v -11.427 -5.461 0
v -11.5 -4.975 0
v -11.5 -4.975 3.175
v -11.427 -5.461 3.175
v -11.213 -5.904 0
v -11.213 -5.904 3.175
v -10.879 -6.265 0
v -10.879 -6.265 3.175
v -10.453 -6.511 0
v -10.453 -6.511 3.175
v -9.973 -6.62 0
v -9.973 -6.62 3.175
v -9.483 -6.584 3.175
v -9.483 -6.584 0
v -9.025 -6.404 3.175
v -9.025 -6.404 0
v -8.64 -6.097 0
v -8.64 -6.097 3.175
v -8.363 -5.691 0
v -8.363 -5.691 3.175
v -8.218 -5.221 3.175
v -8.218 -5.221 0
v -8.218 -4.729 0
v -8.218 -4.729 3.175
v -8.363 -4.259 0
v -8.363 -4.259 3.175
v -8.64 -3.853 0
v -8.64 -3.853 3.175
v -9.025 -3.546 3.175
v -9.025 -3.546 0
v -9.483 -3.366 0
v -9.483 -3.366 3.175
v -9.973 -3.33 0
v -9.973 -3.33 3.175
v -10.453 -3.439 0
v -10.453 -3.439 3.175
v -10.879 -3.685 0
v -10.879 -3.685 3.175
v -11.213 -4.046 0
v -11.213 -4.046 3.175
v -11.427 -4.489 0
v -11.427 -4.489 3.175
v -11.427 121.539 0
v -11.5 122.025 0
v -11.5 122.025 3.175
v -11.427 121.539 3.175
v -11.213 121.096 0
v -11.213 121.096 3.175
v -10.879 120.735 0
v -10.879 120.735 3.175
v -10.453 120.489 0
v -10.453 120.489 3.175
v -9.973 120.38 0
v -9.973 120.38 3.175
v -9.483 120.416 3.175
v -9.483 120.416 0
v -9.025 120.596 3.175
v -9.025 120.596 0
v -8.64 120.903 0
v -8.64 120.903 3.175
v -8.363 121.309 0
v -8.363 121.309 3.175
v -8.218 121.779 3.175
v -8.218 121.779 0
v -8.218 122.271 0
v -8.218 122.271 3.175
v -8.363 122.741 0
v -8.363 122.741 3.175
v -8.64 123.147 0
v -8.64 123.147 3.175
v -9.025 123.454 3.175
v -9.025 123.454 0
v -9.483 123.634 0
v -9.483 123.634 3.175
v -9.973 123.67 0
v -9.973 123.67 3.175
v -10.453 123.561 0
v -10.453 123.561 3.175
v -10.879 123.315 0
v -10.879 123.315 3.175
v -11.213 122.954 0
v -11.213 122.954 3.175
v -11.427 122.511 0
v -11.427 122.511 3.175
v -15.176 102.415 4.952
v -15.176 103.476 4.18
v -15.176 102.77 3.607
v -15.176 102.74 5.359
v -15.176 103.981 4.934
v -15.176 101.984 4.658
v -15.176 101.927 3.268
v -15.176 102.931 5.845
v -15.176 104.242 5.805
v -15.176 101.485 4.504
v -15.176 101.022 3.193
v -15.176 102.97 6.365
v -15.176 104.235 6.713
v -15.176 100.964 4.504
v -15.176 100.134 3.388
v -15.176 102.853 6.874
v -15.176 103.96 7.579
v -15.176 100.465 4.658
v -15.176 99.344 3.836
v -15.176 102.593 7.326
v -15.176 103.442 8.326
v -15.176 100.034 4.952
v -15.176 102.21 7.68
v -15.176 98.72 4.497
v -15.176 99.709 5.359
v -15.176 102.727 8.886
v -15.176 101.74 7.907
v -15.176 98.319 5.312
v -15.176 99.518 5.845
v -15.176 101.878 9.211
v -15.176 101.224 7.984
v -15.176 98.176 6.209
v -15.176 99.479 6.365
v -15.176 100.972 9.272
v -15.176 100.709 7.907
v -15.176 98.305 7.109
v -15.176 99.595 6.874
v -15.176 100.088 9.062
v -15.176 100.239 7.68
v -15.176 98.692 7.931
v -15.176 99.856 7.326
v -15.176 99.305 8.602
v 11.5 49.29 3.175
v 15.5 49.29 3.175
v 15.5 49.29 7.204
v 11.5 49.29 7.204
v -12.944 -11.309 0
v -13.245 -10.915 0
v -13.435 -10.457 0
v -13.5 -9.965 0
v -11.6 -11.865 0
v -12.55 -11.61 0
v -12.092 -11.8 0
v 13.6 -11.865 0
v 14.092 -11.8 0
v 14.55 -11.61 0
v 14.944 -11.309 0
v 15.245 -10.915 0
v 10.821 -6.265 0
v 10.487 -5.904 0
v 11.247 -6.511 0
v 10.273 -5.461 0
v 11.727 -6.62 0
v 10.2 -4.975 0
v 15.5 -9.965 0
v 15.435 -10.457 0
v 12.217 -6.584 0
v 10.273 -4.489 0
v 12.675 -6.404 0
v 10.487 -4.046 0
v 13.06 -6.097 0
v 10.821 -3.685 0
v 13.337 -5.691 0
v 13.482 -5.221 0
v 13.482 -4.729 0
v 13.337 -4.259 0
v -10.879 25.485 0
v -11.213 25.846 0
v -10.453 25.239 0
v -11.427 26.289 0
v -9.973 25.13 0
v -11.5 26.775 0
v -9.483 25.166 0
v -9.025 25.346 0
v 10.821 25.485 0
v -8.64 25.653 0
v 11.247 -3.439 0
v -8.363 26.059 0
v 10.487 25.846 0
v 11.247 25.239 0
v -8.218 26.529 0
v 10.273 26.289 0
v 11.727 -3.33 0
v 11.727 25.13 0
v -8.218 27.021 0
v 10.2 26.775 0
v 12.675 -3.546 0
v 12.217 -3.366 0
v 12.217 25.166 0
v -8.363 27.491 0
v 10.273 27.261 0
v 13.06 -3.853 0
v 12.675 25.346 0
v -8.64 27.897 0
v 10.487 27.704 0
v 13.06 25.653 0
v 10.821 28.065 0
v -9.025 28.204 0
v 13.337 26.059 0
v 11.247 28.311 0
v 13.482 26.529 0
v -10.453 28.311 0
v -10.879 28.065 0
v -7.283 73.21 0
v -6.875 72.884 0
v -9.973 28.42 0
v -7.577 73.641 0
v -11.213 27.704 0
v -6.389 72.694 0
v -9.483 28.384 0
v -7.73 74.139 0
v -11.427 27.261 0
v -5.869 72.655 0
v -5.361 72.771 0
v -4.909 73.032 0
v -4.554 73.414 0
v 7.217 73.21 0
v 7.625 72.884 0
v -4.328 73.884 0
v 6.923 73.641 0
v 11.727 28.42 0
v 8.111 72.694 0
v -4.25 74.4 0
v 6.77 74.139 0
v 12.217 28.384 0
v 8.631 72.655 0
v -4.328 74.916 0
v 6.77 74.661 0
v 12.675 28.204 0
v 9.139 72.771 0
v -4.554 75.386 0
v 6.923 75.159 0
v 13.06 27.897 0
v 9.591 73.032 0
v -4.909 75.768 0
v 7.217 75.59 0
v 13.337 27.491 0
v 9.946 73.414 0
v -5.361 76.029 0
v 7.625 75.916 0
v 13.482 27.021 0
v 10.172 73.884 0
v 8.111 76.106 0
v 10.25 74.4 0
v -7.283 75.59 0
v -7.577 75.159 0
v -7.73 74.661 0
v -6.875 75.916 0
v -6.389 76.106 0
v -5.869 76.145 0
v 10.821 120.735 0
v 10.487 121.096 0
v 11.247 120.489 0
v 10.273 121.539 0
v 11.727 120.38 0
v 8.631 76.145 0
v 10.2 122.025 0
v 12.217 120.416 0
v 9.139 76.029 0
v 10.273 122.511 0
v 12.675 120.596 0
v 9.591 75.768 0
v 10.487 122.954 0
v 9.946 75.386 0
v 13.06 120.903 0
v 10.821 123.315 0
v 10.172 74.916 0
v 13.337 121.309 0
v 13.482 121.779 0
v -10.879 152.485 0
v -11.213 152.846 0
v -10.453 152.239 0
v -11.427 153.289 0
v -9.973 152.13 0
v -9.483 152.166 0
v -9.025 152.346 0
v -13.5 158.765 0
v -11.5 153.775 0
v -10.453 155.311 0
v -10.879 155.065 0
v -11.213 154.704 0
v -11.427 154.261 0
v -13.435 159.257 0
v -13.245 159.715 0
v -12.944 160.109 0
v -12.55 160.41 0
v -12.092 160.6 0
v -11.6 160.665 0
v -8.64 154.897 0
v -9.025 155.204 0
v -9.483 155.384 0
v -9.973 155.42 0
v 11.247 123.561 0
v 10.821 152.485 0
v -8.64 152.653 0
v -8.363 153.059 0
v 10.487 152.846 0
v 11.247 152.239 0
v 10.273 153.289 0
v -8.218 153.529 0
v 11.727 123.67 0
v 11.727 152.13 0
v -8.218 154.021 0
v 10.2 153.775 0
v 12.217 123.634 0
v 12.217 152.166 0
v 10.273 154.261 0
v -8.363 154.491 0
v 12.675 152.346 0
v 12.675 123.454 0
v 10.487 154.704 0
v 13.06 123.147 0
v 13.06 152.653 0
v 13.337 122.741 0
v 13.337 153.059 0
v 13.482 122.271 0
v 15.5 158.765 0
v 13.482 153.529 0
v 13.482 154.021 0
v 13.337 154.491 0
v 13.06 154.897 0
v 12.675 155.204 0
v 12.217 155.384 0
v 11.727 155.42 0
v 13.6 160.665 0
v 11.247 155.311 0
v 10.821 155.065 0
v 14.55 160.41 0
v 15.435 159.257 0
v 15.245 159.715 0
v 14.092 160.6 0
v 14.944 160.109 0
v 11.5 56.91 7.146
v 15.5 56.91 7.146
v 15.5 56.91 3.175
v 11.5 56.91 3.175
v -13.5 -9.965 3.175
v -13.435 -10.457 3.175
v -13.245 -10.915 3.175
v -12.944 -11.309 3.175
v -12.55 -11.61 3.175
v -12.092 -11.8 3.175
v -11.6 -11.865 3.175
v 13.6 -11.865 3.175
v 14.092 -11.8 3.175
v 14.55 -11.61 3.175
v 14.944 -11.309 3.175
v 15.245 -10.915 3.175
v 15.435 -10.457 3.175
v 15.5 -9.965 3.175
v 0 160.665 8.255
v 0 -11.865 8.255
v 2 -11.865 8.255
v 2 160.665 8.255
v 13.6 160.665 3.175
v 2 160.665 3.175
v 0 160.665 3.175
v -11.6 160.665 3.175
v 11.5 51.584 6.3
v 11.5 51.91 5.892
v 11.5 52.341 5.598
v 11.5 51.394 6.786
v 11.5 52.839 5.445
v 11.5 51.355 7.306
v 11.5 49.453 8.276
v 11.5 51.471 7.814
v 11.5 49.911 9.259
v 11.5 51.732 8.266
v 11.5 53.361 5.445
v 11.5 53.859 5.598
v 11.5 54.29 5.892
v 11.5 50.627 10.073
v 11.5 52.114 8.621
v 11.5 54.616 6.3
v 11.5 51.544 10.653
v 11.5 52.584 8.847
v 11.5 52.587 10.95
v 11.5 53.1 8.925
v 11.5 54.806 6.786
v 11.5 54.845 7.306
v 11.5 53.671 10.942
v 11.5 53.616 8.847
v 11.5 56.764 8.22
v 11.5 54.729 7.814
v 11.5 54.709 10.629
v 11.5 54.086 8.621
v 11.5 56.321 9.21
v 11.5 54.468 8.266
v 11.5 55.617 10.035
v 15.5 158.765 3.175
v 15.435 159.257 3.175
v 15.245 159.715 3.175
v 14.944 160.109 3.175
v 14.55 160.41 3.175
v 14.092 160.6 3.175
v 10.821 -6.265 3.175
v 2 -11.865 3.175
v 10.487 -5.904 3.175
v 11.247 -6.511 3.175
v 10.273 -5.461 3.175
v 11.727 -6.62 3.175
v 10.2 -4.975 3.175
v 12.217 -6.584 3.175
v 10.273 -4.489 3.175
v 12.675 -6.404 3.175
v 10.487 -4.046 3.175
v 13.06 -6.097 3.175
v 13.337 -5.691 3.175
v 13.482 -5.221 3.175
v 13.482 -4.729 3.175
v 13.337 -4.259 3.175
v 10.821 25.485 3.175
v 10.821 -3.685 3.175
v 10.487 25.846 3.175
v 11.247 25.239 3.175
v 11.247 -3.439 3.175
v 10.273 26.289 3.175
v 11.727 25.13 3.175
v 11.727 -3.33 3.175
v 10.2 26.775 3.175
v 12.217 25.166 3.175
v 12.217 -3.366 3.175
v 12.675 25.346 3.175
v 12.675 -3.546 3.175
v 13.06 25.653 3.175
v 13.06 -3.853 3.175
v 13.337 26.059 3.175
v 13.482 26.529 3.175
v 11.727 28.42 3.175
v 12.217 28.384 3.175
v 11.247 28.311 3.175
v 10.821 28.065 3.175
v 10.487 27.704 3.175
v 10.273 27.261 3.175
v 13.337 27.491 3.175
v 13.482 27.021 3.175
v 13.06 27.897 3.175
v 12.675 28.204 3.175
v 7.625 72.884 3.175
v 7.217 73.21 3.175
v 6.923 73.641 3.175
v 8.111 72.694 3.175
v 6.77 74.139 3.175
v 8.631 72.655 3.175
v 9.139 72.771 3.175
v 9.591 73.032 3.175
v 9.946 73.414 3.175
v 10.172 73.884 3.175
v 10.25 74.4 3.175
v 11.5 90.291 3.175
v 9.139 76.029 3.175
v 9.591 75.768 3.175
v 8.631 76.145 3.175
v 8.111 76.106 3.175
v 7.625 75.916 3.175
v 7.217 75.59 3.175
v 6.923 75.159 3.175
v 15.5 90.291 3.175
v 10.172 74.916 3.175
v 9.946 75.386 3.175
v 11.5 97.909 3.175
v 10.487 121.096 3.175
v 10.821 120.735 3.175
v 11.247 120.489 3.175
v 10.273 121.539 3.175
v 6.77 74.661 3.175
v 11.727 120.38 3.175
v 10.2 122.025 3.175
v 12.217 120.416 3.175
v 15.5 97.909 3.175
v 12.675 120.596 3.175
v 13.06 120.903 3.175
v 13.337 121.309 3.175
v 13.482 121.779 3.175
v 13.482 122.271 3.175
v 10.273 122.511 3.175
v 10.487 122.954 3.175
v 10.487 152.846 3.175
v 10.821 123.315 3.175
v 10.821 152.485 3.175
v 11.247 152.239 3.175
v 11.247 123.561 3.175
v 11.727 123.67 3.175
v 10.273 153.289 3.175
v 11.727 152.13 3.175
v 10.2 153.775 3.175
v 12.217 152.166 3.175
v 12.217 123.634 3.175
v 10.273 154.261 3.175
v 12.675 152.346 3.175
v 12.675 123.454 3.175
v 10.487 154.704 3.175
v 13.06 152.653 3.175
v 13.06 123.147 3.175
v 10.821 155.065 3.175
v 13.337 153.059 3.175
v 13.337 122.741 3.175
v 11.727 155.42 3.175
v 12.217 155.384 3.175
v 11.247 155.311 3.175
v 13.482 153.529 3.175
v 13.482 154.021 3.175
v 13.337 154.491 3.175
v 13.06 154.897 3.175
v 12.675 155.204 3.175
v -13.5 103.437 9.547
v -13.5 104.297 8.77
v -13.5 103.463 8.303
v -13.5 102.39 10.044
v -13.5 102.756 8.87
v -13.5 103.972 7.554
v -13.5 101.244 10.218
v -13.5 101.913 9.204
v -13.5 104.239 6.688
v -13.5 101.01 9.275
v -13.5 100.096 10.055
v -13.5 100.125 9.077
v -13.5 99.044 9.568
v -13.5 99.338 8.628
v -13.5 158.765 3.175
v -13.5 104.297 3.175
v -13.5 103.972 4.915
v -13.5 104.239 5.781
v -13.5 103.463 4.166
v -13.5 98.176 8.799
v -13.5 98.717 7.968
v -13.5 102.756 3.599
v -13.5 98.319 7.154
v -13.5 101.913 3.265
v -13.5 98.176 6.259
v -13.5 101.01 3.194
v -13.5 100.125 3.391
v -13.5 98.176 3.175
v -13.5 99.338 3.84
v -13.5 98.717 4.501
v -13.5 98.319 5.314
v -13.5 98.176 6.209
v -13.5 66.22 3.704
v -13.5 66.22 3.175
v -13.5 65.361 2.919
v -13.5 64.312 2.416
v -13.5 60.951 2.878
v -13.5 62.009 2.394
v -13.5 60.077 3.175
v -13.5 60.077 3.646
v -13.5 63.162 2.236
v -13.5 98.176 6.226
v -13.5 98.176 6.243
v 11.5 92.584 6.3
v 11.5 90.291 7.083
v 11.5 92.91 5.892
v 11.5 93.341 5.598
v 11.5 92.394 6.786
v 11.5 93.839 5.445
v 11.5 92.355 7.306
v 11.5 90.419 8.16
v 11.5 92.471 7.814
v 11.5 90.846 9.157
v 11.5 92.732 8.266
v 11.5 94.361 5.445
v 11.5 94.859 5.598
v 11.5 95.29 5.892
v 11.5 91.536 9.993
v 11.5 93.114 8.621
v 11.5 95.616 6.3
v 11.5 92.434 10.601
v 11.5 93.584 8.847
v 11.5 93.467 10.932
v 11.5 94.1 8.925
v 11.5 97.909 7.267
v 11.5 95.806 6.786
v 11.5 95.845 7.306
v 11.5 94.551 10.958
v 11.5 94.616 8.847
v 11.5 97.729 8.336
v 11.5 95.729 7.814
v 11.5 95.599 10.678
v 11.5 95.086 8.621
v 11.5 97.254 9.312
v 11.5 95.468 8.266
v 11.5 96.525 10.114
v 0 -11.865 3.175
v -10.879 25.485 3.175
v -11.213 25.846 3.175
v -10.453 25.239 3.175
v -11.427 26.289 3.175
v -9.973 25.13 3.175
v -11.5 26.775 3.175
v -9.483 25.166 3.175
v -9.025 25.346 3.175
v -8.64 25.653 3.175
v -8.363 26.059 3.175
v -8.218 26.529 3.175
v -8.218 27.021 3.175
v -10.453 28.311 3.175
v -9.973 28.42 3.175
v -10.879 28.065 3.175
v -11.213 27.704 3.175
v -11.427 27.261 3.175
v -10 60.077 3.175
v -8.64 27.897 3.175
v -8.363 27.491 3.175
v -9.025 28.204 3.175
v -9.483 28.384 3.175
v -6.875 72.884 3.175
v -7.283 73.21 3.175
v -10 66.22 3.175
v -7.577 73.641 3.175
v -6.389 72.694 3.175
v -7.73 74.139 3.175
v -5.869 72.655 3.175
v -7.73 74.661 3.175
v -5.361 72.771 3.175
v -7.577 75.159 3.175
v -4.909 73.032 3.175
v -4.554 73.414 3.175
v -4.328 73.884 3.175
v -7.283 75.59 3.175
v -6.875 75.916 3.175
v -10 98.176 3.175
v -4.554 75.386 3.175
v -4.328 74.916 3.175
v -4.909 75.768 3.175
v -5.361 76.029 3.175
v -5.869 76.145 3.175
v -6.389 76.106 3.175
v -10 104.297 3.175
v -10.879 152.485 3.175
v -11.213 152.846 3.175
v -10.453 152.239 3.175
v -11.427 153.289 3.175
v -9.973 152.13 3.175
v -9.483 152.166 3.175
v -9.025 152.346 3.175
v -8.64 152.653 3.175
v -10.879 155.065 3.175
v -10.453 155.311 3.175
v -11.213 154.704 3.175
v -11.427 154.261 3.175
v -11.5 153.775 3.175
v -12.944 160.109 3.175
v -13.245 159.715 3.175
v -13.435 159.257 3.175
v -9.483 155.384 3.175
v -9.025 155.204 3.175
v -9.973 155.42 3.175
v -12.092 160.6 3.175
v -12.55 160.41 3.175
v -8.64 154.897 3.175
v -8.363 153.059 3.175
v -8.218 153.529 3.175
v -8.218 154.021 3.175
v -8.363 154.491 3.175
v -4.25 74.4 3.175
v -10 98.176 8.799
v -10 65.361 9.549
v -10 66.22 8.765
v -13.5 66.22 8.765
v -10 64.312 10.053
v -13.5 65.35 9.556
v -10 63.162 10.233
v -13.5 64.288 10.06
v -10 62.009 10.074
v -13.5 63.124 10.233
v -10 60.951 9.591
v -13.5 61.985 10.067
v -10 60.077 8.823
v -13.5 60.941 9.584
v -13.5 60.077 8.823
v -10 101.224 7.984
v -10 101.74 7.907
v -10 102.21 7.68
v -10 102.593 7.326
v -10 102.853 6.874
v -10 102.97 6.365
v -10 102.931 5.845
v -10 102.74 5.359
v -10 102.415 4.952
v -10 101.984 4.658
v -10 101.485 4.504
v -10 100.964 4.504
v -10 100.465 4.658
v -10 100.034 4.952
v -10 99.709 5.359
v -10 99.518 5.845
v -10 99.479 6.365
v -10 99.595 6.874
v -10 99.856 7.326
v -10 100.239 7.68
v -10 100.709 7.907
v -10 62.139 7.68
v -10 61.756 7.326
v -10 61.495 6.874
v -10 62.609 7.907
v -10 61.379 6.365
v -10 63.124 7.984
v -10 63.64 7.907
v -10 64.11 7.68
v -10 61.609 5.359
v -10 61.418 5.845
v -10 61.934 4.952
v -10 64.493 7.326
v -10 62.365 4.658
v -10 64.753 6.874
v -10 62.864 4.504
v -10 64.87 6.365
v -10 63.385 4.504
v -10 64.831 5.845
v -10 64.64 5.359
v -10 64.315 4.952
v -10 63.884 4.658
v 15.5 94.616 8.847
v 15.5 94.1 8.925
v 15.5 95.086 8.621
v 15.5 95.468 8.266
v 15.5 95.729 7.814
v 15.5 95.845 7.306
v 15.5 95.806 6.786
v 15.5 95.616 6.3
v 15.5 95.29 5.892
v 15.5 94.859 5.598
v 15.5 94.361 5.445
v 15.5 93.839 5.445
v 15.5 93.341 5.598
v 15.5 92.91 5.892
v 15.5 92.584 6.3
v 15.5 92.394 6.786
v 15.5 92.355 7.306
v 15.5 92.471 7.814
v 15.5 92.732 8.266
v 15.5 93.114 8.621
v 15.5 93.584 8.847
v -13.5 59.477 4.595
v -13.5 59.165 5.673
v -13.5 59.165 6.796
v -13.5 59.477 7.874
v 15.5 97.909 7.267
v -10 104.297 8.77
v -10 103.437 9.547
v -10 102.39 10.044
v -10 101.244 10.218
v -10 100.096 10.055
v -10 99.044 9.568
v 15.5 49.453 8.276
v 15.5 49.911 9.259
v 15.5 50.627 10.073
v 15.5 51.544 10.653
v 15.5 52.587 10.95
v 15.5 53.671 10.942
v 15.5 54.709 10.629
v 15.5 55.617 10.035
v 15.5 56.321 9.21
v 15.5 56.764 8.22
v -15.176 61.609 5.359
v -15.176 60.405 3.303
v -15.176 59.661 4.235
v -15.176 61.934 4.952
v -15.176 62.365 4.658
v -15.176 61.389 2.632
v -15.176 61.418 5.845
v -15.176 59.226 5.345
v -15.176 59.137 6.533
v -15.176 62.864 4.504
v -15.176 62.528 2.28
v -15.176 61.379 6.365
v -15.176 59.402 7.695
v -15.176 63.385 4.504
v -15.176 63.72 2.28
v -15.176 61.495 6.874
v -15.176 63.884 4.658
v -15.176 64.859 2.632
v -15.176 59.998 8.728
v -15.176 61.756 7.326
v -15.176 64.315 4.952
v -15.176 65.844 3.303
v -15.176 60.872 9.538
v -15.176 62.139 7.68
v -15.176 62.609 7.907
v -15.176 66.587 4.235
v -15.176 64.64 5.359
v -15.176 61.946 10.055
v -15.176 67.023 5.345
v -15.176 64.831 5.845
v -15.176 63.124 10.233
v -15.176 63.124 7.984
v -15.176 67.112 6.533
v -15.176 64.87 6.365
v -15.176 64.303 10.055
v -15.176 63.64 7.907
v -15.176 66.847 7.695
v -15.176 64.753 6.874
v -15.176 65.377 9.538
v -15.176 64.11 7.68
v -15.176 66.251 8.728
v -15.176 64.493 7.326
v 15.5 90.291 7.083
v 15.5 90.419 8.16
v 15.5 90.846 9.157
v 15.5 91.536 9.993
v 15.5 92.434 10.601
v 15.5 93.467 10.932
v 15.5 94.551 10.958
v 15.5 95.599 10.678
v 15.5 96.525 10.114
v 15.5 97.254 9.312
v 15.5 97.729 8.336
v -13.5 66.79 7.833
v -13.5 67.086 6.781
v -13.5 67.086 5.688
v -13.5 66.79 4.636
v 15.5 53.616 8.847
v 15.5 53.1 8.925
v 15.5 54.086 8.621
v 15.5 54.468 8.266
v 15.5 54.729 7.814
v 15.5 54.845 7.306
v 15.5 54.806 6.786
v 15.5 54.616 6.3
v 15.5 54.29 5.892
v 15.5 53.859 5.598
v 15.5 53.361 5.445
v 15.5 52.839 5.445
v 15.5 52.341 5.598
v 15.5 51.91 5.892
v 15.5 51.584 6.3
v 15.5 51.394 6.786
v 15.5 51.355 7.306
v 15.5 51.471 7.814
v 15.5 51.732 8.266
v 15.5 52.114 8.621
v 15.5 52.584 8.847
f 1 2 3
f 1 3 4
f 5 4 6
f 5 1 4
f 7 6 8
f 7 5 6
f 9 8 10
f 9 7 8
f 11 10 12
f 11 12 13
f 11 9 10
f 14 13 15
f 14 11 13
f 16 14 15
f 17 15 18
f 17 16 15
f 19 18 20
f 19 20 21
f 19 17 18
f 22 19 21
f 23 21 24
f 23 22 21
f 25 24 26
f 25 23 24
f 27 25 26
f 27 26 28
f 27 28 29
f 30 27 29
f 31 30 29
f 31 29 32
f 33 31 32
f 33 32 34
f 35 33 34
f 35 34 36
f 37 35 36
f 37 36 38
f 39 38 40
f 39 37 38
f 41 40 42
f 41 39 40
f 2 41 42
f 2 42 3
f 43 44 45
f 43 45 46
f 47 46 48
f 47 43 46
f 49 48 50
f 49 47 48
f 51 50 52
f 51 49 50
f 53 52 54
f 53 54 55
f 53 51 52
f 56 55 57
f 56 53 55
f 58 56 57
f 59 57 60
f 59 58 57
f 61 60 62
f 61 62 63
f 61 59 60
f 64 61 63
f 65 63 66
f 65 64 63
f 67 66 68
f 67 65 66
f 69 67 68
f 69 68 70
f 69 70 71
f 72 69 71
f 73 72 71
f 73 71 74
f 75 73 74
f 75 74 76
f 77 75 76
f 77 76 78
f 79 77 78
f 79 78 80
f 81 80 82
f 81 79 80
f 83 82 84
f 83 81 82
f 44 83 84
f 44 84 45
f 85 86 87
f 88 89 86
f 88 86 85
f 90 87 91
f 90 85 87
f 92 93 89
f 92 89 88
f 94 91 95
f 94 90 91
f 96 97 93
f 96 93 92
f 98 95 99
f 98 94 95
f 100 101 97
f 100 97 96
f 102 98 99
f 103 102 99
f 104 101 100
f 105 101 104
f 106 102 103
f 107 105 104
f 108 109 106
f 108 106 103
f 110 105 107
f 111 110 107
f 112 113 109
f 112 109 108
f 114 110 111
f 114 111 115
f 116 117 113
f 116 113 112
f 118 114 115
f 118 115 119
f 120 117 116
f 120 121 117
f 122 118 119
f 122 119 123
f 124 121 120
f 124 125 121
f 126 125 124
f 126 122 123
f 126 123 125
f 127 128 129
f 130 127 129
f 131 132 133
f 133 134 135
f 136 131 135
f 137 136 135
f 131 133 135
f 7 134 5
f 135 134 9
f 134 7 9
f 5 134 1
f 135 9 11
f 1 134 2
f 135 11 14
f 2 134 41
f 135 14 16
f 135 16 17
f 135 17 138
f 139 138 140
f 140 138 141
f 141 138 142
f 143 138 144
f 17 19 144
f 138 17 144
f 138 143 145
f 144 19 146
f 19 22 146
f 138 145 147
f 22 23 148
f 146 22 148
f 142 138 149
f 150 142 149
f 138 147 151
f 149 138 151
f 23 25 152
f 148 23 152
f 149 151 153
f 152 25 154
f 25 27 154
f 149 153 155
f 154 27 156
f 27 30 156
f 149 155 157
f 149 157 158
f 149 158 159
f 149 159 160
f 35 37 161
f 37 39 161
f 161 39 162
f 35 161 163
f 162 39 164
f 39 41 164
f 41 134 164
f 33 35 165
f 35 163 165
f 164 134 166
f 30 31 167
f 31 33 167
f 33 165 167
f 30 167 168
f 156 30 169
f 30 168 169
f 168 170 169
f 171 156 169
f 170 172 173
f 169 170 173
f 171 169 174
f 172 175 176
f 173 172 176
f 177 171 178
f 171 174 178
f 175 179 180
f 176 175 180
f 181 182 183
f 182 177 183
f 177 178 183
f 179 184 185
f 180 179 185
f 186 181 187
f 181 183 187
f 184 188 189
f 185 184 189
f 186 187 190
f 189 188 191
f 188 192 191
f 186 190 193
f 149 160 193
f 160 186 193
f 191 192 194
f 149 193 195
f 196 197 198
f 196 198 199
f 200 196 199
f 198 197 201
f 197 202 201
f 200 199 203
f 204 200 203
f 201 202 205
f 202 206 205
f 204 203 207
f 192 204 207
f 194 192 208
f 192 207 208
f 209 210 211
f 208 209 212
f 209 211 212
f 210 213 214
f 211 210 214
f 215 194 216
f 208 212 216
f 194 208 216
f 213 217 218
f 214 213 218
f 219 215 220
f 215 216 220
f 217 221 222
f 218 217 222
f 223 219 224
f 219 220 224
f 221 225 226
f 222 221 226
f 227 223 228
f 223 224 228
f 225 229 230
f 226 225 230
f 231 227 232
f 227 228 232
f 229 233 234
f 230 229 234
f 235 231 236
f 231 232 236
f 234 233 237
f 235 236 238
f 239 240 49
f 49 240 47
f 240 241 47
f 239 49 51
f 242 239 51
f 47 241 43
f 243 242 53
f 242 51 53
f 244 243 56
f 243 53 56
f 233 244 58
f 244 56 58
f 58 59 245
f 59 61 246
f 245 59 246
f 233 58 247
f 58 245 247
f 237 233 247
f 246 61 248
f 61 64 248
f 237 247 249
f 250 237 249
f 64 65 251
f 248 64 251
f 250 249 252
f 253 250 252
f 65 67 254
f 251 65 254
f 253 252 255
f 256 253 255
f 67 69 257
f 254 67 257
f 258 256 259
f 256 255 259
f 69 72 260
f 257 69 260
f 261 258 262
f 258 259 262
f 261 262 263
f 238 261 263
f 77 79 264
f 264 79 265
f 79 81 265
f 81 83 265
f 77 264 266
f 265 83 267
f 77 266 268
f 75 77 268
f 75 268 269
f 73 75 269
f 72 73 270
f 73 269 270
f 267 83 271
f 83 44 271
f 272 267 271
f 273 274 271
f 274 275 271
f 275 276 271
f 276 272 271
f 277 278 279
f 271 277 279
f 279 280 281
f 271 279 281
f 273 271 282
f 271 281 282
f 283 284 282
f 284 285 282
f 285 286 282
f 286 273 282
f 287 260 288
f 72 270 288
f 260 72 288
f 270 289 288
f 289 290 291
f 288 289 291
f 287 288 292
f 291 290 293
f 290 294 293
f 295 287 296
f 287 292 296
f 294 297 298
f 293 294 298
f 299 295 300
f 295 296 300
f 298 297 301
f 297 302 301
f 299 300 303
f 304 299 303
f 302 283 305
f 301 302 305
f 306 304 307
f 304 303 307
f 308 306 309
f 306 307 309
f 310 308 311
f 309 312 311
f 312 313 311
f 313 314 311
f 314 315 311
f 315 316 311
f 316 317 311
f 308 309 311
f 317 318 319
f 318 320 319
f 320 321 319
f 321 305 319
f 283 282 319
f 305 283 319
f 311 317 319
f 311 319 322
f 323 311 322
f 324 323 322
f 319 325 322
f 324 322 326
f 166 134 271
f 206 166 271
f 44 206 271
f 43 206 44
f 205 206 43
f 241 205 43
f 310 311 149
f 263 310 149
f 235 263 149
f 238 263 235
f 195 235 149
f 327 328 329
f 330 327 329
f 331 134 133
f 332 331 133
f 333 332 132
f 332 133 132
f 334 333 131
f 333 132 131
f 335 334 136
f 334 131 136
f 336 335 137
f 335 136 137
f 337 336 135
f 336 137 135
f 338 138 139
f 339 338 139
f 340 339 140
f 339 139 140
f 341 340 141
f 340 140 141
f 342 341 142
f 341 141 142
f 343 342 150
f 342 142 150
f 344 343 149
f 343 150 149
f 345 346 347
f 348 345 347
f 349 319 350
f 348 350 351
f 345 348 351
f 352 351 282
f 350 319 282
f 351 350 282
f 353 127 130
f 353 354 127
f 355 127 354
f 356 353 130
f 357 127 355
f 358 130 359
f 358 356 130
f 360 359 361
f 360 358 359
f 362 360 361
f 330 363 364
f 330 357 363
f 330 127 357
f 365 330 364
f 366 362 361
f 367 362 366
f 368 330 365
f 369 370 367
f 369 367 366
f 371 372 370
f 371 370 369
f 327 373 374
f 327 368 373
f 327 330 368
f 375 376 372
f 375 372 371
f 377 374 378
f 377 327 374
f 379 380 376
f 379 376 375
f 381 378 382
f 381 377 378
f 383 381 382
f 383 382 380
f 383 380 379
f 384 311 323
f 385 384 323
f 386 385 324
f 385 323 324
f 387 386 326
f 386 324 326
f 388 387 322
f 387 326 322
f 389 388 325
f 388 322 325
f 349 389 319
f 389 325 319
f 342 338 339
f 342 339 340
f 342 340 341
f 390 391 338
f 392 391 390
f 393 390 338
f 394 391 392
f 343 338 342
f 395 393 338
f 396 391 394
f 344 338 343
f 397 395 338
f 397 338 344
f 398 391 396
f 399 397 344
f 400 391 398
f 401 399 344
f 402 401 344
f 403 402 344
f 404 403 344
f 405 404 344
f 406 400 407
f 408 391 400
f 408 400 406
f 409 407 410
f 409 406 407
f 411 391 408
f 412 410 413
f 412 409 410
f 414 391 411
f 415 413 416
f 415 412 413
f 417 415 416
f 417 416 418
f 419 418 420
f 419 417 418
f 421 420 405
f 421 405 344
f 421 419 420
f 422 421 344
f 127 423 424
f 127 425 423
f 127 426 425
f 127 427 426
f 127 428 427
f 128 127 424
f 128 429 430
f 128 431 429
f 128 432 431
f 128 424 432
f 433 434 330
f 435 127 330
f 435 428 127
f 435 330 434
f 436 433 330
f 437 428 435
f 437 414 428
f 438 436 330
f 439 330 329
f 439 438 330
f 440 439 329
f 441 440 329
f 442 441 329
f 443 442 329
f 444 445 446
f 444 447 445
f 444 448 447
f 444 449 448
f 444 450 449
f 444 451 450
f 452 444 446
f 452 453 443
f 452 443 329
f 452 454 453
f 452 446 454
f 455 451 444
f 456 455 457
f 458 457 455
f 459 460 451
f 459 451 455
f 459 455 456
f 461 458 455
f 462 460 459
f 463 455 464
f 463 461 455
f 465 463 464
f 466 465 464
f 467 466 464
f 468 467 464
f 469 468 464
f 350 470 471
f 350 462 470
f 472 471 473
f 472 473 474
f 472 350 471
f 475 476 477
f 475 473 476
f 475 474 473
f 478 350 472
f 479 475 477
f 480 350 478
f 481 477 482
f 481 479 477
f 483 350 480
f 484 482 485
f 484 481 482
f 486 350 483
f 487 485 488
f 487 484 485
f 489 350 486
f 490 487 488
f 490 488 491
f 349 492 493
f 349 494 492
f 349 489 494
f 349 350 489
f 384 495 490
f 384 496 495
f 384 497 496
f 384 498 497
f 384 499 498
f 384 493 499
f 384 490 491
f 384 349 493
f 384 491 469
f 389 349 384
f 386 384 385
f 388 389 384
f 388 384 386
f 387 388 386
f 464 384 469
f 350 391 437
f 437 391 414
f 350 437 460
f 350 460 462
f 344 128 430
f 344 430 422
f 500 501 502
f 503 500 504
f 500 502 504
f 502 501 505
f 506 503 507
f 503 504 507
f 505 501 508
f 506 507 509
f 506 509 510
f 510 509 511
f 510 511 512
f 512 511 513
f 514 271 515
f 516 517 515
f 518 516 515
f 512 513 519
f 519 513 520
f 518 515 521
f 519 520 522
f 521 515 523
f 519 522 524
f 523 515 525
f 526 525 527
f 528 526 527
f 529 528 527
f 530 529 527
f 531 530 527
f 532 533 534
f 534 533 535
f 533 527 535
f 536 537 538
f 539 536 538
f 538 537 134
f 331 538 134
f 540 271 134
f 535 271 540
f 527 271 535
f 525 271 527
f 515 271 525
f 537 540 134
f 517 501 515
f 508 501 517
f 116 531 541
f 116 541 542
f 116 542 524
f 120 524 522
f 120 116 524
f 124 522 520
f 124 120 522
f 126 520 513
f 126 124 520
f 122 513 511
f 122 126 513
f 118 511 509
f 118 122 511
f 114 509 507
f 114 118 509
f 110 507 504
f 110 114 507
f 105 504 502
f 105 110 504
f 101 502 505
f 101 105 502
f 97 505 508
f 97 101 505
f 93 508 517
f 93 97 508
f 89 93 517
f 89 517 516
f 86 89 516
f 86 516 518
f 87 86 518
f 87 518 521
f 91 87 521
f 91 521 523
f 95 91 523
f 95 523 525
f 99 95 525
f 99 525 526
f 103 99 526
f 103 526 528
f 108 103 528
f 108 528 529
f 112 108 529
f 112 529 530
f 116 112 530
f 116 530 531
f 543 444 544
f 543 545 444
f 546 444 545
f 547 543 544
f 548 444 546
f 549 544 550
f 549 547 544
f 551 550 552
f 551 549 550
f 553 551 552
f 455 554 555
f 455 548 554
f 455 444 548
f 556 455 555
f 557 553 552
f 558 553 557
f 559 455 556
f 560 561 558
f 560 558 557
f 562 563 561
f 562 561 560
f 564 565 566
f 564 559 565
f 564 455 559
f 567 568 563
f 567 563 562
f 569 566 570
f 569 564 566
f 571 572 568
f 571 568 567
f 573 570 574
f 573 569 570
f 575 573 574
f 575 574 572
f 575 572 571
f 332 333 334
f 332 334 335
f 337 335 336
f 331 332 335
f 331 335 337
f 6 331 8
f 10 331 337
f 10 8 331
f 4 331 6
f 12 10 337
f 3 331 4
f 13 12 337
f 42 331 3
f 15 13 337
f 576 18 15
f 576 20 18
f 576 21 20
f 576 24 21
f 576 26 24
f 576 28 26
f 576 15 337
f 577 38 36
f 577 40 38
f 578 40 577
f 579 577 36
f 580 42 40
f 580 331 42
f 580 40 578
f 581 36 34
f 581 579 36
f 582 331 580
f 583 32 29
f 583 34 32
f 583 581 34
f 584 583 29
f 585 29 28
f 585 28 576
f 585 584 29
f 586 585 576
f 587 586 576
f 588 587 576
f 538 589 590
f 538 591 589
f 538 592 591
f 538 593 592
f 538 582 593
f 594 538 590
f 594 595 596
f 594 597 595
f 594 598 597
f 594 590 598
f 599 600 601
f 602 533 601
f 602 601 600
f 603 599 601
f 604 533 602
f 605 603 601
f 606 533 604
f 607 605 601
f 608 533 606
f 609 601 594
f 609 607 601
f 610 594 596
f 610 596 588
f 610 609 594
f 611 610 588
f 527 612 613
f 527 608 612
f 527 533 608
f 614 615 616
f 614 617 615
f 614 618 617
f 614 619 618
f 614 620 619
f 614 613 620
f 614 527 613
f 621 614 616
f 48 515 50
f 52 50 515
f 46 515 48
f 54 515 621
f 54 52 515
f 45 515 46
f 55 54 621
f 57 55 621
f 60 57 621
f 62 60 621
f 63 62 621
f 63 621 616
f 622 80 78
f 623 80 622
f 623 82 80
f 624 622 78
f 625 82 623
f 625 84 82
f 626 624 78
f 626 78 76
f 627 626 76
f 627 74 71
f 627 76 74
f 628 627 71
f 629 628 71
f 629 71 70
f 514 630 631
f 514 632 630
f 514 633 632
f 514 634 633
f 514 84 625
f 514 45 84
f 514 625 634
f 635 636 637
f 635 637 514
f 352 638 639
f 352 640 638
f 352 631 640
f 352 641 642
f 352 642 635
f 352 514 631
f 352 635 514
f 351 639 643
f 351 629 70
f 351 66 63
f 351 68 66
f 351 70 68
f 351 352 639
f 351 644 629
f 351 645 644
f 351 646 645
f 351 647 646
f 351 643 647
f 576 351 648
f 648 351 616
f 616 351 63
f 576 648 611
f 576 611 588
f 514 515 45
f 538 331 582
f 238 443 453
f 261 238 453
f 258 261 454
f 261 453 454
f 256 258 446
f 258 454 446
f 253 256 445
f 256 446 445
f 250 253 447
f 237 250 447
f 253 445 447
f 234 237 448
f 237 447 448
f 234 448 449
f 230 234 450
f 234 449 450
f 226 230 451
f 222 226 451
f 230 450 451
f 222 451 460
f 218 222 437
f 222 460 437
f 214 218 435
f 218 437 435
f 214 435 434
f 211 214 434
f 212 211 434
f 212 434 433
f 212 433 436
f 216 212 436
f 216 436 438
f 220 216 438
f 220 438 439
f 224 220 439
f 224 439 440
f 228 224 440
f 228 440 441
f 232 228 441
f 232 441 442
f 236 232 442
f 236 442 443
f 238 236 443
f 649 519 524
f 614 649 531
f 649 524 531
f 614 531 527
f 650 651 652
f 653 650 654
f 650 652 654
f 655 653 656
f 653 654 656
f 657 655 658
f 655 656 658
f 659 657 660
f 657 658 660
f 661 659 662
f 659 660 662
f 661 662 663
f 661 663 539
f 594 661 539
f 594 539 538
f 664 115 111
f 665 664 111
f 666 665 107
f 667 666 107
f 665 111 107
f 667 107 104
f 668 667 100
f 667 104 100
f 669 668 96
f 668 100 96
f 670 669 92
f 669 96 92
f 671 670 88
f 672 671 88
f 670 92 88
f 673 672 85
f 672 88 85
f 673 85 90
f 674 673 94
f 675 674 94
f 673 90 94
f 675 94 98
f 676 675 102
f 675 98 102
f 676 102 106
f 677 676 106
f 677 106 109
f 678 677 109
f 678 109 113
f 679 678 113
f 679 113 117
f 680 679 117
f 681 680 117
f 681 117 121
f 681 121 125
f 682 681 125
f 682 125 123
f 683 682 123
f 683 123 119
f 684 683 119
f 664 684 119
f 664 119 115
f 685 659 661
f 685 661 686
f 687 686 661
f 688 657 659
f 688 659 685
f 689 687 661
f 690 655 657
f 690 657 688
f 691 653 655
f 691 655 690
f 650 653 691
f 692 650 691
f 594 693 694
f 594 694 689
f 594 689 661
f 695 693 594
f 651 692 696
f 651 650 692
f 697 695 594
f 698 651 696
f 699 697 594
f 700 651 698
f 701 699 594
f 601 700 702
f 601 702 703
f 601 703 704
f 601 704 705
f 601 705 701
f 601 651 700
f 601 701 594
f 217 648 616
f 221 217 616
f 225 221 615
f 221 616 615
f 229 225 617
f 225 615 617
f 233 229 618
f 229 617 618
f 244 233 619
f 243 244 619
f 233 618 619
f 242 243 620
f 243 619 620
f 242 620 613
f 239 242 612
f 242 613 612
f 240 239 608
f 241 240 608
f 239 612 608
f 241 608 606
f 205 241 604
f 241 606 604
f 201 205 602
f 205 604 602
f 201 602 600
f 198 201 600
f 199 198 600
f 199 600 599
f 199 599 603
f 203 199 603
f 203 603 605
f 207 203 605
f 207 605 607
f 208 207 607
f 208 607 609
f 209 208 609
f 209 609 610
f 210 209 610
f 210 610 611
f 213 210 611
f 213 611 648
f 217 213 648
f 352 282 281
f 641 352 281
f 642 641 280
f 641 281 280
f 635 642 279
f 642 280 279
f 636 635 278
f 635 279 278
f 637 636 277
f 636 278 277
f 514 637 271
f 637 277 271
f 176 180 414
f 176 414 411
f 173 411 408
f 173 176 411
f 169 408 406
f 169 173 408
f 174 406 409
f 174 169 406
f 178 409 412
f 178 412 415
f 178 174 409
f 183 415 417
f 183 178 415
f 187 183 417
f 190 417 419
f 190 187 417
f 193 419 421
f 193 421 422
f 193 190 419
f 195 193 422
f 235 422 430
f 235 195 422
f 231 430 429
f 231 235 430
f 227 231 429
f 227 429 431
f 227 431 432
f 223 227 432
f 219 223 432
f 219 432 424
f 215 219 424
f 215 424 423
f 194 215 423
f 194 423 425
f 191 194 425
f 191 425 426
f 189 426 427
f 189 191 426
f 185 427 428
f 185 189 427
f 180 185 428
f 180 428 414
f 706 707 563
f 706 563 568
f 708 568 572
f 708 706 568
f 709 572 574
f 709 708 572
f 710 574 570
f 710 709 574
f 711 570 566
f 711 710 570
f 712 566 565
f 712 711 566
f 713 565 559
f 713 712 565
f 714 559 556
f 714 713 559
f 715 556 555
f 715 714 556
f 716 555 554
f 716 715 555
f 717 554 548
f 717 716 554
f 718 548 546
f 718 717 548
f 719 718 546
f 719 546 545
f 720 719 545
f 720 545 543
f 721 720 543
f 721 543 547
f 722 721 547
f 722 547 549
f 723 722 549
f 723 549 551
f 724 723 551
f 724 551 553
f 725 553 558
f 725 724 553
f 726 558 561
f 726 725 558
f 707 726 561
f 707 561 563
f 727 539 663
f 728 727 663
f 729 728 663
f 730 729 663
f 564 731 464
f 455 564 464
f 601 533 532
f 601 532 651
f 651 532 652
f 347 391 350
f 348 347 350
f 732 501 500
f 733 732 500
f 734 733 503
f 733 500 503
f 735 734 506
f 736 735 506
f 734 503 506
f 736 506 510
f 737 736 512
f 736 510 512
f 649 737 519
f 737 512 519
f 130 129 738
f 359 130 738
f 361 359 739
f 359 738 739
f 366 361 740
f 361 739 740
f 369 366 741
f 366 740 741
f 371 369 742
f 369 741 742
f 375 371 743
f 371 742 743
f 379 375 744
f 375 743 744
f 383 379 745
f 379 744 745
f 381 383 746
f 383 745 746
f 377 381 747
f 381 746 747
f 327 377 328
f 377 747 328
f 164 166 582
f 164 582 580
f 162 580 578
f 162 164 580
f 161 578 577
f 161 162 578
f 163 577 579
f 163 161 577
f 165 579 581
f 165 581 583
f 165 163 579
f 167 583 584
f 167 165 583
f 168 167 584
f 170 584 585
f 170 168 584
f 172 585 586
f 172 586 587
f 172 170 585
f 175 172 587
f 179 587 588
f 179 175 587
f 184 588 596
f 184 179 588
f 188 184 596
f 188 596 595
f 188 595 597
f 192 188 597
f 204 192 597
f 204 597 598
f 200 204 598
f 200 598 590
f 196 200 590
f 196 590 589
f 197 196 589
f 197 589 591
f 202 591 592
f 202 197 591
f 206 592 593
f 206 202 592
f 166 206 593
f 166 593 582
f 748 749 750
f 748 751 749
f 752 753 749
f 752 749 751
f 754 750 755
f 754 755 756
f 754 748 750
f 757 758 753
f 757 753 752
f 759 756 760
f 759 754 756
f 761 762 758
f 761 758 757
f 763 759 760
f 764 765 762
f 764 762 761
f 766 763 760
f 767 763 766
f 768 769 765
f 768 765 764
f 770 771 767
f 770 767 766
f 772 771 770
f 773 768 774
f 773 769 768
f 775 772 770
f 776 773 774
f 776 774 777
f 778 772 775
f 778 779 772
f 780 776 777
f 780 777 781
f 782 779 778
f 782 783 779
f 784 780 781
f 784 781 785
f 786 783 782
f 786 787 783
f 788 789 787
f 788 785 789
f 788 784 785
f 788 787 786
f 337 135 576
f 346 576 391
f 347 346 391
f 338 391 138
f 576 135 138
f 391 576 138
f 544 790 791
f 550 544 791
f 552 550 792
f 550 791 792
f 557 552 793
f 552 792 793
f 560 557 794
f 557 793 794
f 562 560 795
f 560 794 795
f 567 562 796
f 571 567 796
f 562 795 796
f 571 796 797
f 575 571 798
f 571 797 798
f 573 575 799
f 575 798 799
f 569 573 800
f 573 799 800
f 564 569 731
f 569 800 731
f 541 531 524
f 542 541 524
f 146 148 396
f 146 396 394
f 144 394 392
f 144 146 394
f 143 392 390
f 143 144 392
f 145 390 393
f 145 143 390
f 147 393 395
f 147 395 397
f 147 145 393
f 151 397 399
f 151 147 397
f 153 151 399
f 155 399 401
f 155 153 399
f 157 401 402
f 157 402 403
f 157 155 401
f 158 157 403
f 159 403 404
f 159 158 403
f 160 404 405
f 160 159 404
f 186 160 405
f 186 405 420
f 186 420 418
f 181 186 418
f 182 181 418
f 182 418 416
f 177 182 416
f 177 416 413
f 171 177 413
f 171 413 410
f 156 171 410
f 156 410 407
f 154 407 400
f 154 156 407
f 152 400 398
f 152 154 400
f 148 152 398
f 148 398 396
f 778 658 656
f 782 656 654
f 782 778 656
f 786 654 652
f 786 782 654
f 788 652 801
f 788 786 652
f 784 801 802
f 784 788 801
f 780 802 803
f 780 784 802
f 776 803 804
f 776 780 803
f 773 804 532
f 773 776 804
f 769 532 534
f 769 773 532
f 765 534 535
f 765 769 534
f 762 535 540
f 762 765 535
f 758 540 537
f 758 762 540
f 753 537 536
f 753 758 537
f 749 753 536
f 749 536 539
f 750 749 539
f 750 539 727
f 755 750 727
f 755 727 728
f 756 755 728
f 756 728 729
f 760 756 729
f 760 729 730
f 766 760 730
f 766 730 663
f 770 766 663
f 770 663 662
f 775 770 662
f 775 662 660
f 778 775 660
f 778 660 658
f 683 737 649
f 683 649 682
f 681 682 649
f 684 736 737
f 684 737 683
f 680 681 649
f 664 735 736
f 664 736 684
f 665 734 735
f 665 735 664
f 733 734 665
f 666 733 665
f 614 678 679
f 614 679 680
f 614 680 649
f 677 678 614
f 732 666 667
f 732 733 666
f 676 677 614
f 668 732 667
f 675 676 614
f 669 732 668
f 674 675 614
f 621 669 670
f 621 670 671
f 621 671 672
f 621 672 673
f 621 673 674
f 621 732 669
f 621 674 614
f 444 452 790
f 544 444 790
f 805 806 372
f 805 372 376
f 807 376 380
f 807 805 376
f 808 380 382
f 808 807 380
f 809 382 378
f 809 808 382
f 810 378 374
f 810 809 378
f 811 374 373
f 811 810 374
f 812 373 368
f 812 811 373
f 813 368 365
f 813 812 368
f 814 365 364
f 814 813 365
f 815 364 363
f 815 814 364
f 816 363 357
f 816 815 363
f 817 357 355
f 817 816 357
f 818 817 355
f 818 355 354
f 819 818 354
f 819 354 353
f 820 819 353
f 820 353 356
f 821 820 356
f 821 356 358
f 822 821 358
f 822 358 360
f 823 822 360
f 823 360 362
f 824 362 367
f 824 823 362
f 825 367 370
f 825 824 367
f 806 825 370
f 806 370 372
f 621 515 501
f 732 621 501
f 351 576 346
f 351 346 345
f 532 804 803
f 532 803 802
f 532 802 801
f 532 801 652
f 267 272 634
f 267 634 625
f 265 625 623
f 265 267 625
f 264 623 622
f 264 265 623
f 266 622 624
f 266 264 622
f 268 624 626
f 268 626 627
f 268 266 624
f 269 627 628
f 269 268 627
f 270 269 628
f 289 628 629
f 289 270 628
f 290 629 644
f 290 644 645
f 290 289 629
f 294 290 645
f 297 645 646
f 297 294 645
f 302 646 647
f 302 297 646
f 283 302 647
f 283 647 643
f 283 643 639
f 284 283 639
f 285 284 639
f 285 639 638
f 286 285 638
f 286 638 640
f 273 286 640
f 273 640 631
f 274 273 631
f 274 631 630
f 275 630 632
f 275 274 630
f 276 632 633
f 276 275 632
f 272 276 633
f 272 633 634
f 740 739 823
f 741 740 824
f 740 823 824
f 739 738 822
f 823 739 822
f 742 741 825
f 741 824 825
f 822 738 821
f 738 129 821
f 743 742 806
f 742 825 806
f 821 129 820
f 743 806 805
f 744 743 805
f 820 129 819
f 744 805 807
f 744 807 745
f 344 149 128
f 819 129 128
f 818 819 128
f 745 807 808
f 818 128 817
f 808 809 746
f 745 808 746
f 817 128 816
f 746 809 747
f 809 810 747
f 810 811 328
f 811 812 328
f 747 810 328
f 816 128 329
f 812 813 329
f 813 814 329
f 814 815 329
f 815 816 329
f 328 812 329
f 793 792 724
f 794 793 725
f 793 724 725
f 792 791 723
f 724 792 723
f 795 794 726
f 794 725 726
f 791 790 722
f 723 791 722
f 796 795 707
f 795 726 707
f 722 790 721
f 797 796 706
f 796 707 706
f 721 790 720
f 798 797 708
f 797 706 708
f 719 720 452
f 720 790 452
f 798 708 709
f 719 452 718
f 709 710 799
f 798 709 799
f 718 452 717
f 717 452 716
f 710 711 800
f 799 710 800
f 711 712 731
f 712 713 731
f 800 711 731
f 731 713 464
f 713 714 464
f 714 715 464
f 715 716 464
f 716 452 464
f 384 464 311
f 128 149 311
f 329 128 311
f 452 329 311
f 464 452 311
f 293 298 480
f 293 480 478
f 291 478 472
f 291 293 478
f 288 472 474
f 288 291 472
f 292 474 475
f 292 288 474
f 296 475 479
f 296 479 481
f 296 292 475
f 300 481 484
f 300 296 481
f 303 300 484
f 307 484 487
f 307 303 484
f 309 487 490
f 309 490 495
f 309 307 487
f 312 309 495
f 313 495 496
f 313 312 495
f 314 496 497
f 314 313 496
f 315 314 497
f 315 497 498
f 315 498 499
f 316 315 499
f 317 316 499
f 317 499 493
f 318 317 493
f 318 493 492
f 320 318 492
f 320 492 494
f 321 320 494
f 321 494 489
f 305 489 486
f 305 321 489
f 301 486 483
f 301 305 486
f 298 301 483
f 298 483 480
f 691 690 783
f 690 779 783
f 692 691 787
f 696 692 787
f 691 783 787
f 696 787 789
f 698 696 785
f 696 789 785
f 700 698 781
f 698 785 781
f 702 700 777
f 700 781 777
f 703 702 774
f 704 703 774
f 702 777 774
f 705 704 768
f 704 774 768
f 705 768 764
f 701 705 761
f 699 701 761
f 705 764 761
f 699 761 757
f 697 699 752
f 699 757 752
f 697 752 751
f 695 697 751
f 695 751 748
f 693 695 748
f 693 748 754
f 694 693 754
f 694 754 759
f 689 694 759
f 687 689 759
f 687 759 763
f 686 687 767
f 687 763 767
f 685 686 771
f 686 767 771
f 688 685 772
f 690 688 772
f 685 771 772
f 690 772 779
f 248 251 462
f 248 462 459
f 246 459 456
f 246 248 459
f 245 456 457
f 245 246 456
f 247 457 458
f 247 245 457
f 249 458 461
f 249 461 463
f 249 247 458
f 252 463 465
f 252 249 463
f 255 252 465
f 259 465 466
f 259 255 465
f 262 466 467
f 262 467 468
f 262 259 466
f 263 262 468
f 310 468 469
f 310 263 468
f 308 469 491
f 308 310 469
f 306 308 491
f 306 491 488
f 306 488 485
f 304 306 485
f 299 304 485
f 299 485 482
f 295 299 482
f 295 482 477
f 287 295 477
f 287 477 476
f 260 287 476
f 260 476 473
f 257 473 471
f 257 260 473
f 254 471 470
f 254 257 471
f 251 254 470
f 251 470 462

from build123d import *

# Parameters (mm, degrees)
SKETCH1_R           = 1.65
BOSS_EXTRUDE1_DEPTH = 3.175
SKETCH2_W           = 1
SKETCH2_H           = 172.53
BOSS_EXTRUDE2_DEPTH = 5.08
SKETCH4_R           = 1.75
BOSS_EXTRUDE3_DEPTH = 3.5
BOSS_EXTRUDE4_START = 1.6764
SKETCH5_R           = 3.048
SKETCH5_R_2         = 1.75
SKETCH5_R_3         = 3.998686497
BOSS_EXTRUDE4_DEPTH = 1.6764
SKETCH6_R           = 1.75
BOSS_EXTRUDE5_DEPTH = 4
SKETCH7_R           = 1.75
CUT_EXTRUDE1_DEPTH  = 4.54
SKETCH8_R           = 1.75
CUT_EXTRUDE2_DEPTH  = 162.599778233


with BuildPart() as part:
    # Sketch1 → Boss-Extrude1 (new body)
    with BuildSketch(Plane.XY):
        with BuildLine():
            Line((13.6, 160.665), (-11.6, 160.665))
            ThreePointArc((-11.6, 160.665), (-12.943502884, 160.108502884), (-13.5, 158.765))
            Line((-13.5, 158.765), (-13.5, -9.965))
            ThreePointArc((-13.5, -9.965), (-12.943502884, -11.308502884), (-11.6, -11.865))
            Line((-11.6, -11.865), (13.6, -11.865))
            ThreePointArc((13.6, -11.865), (14.943502884, -11.308502884), (15.5, -9.965))
            Line((15.5, -9.965), (15.5, 158.765))
            ThreePointArc((15.5, 158.765), (14.943502884, 160.108502884), (13.6, 160.665))
        make_face()
        with Locations(Location((-9.85, -4.975, 0), (0, 0, 180))):
            Circle(SKETCH1_R, mode=Mode.SUBTRACT)
        with Locations(Location((-9.85, 26.775, 0), (0, 0, 180))):
            Circle(SKETCH1_R, mode=Mode.SUBTRACT)
        with Locations(Location((11.85, -4.975, 0), (0, 0, 180))):
            Circle(SKETCH1_R, mode=Mode.SUBTRACT)
        with Locations(Location((11.85, 26.775, 0), (0, 0, 180))):
            Circle(SKETCH1_R, mode=Mode.SUBTRACT)
        with Locations(Location((-9.85, 122.025, 0), (0, 0, 180))):
            Circle(SKETCH1_R, mode=Mode.SUBTRACT)
        with Locations(Location((-9.85, 153.775, 0), (0, 0, 180))):
            Circle(SKETCH1_R, mode=Mode.SUBTRACT)
        with Locations(Location((11.85, 122.025, 0), (0, 0, 180))):
            Circle(SKETCH1_R, mode=Mode.SUBTRACT)
        with Locations(Location((11.85, 153.775, 0), (0, 0, 180))):
            Circle(SKETCH1_R, mode=Mode.SUBTRACT)
    extrude(amount=BOSS_EXTRUDE1_DEPTH)

    # Sketch2 → Boss-Extrude2 (add)
    with BuildSketch(Plane.XY.offset(3.175)):
        with Locations((1.5, 74.4)):
            Rectangle(SKETCH2_W, SKETCH2_H)
        with Locations((0.5, 74.4)):
            Rectangle(SKETCH2_W, SKETCH2_H)
    extrude(amount=BOSS_EXTRUDE2_DEPTH)

    # Sketch4 → Boss-Extrude3 (add)
    # profile 1 of 2: a face of its own
    with BuildSketch(Plane.ZY.offset(13.5)):
        with BuildLine():
            Line((8.82313313, 60.076784691), (3.175, 60.076784691))
            Line((3.175, 60.076784691), (3.175, 66.220321271))
            Line((3.175, 66.220321271), (8.765152639, 66.220321271))
            ThreePointArc((8.765152639, 66.220321271), (10.232903429, 63.162131486), (8.82313313, 60.076784691))
        make_face()
        with Locations((6.234395, 63.124395)):
            Circle(SKETCH4_R, mode=Mode.SUBTRACT)
    # profile 2 of 2: a face of its own
    with BuildSketch(Plane.ZY.offset(13.5)):
        with BuildLine():
            Line((8.799348167, 98.176497144), (3.175, 98.176497144))
            Line((3.175, 98.176497144), (3.175, 104.29693575))
            Line((3.175, 104.29693575), (8.769776515, 104.29693575))
            ThreePointArc((8.769776515, 104.29693575), (10.217897937, 101.243641784), (8.799348167, 98.176497144))
        make_face()
        with Locations((6.234395, 101.224395)):
            Circle(SKETCH4_R, mode=Mode.SUBTRACT)
    extrude(amount=-BOSS_EXTRUDE3_DEPTH)

    # Sketch5 → Boss-Extrude4 (add)
    # profile 1 of 2: a face of its own
    with BuildSketch(Plane.ZY.offset(13.5).offset(BOSS_EXTRUDE4_START)):
        with Locations(Location((6.234395, 101.224395, 0), (0, 0, 269.530929423))):
            Circle(SKETCH5_R)
        with Locations((6.234395, 101.224395)):
            Circle(SKETCH5_R_2, mode=Mode.SUBTRACT)
    # profile 2 of 2: a face of its own
    with BuildSketch(Plane.ZY.offset(13.5).offset(BOSS_EXTRUDE4_START)):
        with Locations((6.234395, 63.124395)):
            Circle(SKETCH5_R_3)
        with Locations((6.234395, 63.124395)):
            Circle(SKETCH5_R_2, mode=Mode.SUBTRACT)
    extrude(amount=-BOSS_EXTRUDE4_DEPTH)

    # Sketch6 → Boss-Extrude5 (add)
    # profile 1 of 2: a face of its own
    with BuildSketch(Plane.ZY.offset(-15.5)):
        with BuildLine():
            Line((7.145936701, 56.909889149), (3.175, 56.909889149))
            Line((3.175, 56.909889149), (3.175, 49.290110851))
            Line((3.175, 49.290110851), (7.204063299, 49.290110851))
            ThreePointArc((7.204063299, 49.290110851), (10.984889149, 53.129063299), (7.145936701, 56.909889149))
        make_face()
        with Locations((7.175, 53.1)):
            Circle(SKETCH6_R, mode=Mode.SUBTRACT)
    # profile 2 of 2: a face of its own
    with BuildSketch(Plane.ZY.offset(-15.5)):
        with BuildLine():
            Line((7.267081375, 97.90888711), (3.175, 97.90888711))
            Line((3.175, 97.90888711), (3.175, 90.29111289))
            Line((3.175, 90.29111289), (7.082918625, 90.29111289))
            ThreePointArc((7.082918625, 90.29111289), (10.98388711, 94.007918625), (7.267081375, 97.90888711))
        make_face()
        with Locations((7.175, 94.1)):
            Circle(SKETCH6_R, mode=Mode.SUBTRACT)
    extrude(amount=BOSS_EXTRUDE5_DEPTH)

    # Sketch7 → Cut-Extrude1 (cut)
    with BuildSketch(Plane.XY.offset(3.175)):
        with Locations((8.5, 74.4)):
            Circle(SKETCH7_R)
    extrude(amount=-CUT_EXTRUDE1_DEPTH, mode=Mode.SUBTRACT)

    # Sketch8 → Cut-Extrude2 (cut, through all)
    with BuildSketch(Plane.XY.offset(3.175)):
        with Locations((-6, 74.4)):
            Circle(SKETCH8_R)
    extrude(amount=-CUT_EXTRUDE2_DEPTH, mode=Mode.SUBTRACT)


solid = part.part
